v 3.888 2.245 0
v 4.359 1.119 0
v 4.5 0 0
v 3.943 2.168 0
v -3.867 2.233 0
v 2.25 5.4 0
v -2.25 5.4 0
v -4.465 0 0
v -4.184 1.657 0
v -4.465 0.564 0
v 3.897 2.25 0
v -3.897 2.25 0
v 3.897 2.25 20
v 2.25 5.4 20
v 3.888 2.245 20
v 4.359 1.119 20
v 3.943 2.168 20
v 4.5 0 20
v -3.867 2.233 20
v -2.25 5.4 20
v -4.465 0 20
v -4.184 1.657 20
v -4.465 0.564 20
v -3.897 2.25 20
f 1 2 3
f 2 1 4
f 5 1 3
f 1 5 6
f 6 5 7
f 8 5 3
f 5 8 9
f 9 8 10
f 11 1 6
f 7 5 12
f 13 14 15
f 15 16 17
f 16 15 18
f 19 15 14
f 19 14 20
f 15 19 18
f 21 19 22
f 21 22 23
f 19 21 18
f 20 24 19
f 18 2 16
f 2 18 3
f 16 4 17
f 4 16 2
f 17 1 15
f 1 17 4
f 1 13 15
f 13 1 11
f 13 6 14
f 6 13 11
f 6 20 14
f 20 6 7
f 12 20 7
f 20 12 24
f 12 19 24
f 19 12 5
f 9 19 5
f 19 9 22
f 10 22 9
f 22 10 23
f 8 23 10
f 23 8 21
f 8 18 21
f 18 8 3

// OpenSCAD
// PRUSA Mendel  
// Bushings
// GNU GPL v3
// Josef Průša
// josefprusa@me.com
// prusadjs.cz
// http://www.reprap.org/wiki/Prusa_Mendel
// http://github.com/prusajr/PrusaMendel

teardropcentering2();

module teardrop (r=4.5,h=20)
{
	rotate([-270,0,90])
	linear_extrude(height=h)
	{
		circle(r=r, $fn = 25);
		polygon(points=[[0,0],[r*cos(30),r*sin(30)],[0.5*r,r],[-0.5*r,r],[-r*cos(30),r*sin(30)]],
				paths=[[0,1,2,3,4]]);
	}
}

module teardropcentering (r=4.5,h=20)
{
	rotate([-270,0,90])
	linear_extrude(height=h)
	{
		circle(r=r, $fn = 25);
		polygon(points=[[0,0],[r*cos(30),r*sin(30)],[0.5*r,1.2*r],[-0.5*r,1.2*r],[-r*cos(30),r*sin(30)]],
				paths=[[0,1,2,3,4]]);
	}
}

module teardropcentering2 (r=4.5,h=20)
{
	//rotate([-270,0,90])
	difference(){
	linear_extrude(height=h)
	{
		circle(r=r, $fn = 25);
		polygon(points=[[0,0],[r*cos(30),r*sin(30)],[0.5*r,1.2*r],[-0.5*r,1.2*r],[-r*cos(30),r*sin(30)]],
				paths=[[0,1,2,3,4]]);
	}
	translate(v = [-1.5*r, -1.5*r,-1])cube(size =[3*r,1.5*r,h+2]);
	}
}
